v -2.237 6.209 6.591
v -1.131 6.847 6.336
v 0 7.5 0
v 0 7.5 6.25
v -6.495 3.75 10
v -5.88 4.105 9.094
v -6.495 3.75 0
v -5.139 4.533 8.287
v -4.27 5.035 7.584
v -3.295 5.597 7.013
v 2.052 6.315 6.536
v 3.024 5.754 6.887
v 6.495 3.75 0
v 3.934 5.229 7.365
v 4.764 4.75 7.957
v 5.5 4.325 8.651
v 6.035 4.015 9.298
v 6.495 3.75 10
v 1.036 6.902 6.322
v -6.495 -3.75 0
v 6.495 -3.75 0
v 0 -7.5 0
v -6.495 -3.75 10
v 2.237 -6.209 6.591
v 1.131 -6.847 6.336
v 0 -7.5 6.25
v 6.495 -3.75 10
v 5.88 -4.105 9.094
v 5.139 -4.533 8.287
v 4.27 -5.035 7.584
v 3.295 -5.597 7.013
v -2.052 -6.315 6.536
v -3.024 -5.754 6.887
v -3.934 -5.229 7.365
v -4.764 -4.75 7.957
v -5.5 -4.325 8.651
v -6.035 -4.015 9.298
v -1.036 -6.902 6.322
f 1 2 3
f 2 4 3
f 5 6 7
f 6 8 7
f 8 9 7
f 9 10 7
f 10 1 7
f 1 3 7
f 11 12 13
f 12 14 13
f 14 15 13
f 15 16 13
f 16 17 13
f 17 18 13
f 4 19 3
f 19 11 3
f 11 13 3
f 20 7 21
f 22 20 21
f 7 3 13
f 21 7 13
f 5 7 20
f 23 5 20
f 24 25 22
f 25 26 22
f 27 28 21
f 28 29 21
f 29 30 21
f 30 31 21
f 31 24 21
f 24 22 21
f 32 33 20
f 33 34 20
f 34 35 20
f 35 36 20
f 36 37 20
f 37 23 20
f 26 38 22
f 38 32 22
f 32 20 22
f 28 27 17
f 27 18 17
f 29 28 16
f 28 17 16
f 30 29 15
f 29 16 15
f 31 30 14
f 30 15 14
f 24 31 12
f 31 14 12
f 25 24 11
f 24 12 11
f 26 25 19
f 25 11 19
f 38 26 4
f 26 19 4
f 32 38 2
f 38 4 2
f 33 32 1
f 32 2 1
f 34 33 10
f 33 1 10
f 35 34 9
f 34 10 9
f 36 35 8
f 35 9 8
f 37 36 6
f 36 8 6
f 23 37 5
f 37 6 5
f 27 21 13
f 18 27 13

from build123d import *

# Parameters (mm, degrees)
BOSS_EXTRUDE1_DEPTH = 10
SKETCH2_R           = 7.5
CUT_EXTRUDE1_DEPTH  = 13.5


with BuildPart() as part:
    # Sketch1 → Boss-Extrude1 (new body)
    with BuildSketch(Plane.XY):
        Polygon((0, -7.5), (6.495190528, -3.75), (6.495190528, 3.75), (0, 7.5), (-6.495190528, 3.75), (-6.495190528, -3.75), align=None)
    extrude(amount=BOSS_EXTRUDE1_DEPTH)

    # Sketch2 → Cut-Extrude1 (cut, symmetric)
    with BuildSketch(Plane(origin=(0, 0, 0), x_dir=(0, 0, -1), z_dir=(0, 1, 0))):
        with Locations((-13.75, 0)):
            Circle(SKETCH2_R)
    extrude(amount=CUT_EXTRUDE1_DEPTH, both=True, mode=Mode.SUBTRACT)


solid = part.part
